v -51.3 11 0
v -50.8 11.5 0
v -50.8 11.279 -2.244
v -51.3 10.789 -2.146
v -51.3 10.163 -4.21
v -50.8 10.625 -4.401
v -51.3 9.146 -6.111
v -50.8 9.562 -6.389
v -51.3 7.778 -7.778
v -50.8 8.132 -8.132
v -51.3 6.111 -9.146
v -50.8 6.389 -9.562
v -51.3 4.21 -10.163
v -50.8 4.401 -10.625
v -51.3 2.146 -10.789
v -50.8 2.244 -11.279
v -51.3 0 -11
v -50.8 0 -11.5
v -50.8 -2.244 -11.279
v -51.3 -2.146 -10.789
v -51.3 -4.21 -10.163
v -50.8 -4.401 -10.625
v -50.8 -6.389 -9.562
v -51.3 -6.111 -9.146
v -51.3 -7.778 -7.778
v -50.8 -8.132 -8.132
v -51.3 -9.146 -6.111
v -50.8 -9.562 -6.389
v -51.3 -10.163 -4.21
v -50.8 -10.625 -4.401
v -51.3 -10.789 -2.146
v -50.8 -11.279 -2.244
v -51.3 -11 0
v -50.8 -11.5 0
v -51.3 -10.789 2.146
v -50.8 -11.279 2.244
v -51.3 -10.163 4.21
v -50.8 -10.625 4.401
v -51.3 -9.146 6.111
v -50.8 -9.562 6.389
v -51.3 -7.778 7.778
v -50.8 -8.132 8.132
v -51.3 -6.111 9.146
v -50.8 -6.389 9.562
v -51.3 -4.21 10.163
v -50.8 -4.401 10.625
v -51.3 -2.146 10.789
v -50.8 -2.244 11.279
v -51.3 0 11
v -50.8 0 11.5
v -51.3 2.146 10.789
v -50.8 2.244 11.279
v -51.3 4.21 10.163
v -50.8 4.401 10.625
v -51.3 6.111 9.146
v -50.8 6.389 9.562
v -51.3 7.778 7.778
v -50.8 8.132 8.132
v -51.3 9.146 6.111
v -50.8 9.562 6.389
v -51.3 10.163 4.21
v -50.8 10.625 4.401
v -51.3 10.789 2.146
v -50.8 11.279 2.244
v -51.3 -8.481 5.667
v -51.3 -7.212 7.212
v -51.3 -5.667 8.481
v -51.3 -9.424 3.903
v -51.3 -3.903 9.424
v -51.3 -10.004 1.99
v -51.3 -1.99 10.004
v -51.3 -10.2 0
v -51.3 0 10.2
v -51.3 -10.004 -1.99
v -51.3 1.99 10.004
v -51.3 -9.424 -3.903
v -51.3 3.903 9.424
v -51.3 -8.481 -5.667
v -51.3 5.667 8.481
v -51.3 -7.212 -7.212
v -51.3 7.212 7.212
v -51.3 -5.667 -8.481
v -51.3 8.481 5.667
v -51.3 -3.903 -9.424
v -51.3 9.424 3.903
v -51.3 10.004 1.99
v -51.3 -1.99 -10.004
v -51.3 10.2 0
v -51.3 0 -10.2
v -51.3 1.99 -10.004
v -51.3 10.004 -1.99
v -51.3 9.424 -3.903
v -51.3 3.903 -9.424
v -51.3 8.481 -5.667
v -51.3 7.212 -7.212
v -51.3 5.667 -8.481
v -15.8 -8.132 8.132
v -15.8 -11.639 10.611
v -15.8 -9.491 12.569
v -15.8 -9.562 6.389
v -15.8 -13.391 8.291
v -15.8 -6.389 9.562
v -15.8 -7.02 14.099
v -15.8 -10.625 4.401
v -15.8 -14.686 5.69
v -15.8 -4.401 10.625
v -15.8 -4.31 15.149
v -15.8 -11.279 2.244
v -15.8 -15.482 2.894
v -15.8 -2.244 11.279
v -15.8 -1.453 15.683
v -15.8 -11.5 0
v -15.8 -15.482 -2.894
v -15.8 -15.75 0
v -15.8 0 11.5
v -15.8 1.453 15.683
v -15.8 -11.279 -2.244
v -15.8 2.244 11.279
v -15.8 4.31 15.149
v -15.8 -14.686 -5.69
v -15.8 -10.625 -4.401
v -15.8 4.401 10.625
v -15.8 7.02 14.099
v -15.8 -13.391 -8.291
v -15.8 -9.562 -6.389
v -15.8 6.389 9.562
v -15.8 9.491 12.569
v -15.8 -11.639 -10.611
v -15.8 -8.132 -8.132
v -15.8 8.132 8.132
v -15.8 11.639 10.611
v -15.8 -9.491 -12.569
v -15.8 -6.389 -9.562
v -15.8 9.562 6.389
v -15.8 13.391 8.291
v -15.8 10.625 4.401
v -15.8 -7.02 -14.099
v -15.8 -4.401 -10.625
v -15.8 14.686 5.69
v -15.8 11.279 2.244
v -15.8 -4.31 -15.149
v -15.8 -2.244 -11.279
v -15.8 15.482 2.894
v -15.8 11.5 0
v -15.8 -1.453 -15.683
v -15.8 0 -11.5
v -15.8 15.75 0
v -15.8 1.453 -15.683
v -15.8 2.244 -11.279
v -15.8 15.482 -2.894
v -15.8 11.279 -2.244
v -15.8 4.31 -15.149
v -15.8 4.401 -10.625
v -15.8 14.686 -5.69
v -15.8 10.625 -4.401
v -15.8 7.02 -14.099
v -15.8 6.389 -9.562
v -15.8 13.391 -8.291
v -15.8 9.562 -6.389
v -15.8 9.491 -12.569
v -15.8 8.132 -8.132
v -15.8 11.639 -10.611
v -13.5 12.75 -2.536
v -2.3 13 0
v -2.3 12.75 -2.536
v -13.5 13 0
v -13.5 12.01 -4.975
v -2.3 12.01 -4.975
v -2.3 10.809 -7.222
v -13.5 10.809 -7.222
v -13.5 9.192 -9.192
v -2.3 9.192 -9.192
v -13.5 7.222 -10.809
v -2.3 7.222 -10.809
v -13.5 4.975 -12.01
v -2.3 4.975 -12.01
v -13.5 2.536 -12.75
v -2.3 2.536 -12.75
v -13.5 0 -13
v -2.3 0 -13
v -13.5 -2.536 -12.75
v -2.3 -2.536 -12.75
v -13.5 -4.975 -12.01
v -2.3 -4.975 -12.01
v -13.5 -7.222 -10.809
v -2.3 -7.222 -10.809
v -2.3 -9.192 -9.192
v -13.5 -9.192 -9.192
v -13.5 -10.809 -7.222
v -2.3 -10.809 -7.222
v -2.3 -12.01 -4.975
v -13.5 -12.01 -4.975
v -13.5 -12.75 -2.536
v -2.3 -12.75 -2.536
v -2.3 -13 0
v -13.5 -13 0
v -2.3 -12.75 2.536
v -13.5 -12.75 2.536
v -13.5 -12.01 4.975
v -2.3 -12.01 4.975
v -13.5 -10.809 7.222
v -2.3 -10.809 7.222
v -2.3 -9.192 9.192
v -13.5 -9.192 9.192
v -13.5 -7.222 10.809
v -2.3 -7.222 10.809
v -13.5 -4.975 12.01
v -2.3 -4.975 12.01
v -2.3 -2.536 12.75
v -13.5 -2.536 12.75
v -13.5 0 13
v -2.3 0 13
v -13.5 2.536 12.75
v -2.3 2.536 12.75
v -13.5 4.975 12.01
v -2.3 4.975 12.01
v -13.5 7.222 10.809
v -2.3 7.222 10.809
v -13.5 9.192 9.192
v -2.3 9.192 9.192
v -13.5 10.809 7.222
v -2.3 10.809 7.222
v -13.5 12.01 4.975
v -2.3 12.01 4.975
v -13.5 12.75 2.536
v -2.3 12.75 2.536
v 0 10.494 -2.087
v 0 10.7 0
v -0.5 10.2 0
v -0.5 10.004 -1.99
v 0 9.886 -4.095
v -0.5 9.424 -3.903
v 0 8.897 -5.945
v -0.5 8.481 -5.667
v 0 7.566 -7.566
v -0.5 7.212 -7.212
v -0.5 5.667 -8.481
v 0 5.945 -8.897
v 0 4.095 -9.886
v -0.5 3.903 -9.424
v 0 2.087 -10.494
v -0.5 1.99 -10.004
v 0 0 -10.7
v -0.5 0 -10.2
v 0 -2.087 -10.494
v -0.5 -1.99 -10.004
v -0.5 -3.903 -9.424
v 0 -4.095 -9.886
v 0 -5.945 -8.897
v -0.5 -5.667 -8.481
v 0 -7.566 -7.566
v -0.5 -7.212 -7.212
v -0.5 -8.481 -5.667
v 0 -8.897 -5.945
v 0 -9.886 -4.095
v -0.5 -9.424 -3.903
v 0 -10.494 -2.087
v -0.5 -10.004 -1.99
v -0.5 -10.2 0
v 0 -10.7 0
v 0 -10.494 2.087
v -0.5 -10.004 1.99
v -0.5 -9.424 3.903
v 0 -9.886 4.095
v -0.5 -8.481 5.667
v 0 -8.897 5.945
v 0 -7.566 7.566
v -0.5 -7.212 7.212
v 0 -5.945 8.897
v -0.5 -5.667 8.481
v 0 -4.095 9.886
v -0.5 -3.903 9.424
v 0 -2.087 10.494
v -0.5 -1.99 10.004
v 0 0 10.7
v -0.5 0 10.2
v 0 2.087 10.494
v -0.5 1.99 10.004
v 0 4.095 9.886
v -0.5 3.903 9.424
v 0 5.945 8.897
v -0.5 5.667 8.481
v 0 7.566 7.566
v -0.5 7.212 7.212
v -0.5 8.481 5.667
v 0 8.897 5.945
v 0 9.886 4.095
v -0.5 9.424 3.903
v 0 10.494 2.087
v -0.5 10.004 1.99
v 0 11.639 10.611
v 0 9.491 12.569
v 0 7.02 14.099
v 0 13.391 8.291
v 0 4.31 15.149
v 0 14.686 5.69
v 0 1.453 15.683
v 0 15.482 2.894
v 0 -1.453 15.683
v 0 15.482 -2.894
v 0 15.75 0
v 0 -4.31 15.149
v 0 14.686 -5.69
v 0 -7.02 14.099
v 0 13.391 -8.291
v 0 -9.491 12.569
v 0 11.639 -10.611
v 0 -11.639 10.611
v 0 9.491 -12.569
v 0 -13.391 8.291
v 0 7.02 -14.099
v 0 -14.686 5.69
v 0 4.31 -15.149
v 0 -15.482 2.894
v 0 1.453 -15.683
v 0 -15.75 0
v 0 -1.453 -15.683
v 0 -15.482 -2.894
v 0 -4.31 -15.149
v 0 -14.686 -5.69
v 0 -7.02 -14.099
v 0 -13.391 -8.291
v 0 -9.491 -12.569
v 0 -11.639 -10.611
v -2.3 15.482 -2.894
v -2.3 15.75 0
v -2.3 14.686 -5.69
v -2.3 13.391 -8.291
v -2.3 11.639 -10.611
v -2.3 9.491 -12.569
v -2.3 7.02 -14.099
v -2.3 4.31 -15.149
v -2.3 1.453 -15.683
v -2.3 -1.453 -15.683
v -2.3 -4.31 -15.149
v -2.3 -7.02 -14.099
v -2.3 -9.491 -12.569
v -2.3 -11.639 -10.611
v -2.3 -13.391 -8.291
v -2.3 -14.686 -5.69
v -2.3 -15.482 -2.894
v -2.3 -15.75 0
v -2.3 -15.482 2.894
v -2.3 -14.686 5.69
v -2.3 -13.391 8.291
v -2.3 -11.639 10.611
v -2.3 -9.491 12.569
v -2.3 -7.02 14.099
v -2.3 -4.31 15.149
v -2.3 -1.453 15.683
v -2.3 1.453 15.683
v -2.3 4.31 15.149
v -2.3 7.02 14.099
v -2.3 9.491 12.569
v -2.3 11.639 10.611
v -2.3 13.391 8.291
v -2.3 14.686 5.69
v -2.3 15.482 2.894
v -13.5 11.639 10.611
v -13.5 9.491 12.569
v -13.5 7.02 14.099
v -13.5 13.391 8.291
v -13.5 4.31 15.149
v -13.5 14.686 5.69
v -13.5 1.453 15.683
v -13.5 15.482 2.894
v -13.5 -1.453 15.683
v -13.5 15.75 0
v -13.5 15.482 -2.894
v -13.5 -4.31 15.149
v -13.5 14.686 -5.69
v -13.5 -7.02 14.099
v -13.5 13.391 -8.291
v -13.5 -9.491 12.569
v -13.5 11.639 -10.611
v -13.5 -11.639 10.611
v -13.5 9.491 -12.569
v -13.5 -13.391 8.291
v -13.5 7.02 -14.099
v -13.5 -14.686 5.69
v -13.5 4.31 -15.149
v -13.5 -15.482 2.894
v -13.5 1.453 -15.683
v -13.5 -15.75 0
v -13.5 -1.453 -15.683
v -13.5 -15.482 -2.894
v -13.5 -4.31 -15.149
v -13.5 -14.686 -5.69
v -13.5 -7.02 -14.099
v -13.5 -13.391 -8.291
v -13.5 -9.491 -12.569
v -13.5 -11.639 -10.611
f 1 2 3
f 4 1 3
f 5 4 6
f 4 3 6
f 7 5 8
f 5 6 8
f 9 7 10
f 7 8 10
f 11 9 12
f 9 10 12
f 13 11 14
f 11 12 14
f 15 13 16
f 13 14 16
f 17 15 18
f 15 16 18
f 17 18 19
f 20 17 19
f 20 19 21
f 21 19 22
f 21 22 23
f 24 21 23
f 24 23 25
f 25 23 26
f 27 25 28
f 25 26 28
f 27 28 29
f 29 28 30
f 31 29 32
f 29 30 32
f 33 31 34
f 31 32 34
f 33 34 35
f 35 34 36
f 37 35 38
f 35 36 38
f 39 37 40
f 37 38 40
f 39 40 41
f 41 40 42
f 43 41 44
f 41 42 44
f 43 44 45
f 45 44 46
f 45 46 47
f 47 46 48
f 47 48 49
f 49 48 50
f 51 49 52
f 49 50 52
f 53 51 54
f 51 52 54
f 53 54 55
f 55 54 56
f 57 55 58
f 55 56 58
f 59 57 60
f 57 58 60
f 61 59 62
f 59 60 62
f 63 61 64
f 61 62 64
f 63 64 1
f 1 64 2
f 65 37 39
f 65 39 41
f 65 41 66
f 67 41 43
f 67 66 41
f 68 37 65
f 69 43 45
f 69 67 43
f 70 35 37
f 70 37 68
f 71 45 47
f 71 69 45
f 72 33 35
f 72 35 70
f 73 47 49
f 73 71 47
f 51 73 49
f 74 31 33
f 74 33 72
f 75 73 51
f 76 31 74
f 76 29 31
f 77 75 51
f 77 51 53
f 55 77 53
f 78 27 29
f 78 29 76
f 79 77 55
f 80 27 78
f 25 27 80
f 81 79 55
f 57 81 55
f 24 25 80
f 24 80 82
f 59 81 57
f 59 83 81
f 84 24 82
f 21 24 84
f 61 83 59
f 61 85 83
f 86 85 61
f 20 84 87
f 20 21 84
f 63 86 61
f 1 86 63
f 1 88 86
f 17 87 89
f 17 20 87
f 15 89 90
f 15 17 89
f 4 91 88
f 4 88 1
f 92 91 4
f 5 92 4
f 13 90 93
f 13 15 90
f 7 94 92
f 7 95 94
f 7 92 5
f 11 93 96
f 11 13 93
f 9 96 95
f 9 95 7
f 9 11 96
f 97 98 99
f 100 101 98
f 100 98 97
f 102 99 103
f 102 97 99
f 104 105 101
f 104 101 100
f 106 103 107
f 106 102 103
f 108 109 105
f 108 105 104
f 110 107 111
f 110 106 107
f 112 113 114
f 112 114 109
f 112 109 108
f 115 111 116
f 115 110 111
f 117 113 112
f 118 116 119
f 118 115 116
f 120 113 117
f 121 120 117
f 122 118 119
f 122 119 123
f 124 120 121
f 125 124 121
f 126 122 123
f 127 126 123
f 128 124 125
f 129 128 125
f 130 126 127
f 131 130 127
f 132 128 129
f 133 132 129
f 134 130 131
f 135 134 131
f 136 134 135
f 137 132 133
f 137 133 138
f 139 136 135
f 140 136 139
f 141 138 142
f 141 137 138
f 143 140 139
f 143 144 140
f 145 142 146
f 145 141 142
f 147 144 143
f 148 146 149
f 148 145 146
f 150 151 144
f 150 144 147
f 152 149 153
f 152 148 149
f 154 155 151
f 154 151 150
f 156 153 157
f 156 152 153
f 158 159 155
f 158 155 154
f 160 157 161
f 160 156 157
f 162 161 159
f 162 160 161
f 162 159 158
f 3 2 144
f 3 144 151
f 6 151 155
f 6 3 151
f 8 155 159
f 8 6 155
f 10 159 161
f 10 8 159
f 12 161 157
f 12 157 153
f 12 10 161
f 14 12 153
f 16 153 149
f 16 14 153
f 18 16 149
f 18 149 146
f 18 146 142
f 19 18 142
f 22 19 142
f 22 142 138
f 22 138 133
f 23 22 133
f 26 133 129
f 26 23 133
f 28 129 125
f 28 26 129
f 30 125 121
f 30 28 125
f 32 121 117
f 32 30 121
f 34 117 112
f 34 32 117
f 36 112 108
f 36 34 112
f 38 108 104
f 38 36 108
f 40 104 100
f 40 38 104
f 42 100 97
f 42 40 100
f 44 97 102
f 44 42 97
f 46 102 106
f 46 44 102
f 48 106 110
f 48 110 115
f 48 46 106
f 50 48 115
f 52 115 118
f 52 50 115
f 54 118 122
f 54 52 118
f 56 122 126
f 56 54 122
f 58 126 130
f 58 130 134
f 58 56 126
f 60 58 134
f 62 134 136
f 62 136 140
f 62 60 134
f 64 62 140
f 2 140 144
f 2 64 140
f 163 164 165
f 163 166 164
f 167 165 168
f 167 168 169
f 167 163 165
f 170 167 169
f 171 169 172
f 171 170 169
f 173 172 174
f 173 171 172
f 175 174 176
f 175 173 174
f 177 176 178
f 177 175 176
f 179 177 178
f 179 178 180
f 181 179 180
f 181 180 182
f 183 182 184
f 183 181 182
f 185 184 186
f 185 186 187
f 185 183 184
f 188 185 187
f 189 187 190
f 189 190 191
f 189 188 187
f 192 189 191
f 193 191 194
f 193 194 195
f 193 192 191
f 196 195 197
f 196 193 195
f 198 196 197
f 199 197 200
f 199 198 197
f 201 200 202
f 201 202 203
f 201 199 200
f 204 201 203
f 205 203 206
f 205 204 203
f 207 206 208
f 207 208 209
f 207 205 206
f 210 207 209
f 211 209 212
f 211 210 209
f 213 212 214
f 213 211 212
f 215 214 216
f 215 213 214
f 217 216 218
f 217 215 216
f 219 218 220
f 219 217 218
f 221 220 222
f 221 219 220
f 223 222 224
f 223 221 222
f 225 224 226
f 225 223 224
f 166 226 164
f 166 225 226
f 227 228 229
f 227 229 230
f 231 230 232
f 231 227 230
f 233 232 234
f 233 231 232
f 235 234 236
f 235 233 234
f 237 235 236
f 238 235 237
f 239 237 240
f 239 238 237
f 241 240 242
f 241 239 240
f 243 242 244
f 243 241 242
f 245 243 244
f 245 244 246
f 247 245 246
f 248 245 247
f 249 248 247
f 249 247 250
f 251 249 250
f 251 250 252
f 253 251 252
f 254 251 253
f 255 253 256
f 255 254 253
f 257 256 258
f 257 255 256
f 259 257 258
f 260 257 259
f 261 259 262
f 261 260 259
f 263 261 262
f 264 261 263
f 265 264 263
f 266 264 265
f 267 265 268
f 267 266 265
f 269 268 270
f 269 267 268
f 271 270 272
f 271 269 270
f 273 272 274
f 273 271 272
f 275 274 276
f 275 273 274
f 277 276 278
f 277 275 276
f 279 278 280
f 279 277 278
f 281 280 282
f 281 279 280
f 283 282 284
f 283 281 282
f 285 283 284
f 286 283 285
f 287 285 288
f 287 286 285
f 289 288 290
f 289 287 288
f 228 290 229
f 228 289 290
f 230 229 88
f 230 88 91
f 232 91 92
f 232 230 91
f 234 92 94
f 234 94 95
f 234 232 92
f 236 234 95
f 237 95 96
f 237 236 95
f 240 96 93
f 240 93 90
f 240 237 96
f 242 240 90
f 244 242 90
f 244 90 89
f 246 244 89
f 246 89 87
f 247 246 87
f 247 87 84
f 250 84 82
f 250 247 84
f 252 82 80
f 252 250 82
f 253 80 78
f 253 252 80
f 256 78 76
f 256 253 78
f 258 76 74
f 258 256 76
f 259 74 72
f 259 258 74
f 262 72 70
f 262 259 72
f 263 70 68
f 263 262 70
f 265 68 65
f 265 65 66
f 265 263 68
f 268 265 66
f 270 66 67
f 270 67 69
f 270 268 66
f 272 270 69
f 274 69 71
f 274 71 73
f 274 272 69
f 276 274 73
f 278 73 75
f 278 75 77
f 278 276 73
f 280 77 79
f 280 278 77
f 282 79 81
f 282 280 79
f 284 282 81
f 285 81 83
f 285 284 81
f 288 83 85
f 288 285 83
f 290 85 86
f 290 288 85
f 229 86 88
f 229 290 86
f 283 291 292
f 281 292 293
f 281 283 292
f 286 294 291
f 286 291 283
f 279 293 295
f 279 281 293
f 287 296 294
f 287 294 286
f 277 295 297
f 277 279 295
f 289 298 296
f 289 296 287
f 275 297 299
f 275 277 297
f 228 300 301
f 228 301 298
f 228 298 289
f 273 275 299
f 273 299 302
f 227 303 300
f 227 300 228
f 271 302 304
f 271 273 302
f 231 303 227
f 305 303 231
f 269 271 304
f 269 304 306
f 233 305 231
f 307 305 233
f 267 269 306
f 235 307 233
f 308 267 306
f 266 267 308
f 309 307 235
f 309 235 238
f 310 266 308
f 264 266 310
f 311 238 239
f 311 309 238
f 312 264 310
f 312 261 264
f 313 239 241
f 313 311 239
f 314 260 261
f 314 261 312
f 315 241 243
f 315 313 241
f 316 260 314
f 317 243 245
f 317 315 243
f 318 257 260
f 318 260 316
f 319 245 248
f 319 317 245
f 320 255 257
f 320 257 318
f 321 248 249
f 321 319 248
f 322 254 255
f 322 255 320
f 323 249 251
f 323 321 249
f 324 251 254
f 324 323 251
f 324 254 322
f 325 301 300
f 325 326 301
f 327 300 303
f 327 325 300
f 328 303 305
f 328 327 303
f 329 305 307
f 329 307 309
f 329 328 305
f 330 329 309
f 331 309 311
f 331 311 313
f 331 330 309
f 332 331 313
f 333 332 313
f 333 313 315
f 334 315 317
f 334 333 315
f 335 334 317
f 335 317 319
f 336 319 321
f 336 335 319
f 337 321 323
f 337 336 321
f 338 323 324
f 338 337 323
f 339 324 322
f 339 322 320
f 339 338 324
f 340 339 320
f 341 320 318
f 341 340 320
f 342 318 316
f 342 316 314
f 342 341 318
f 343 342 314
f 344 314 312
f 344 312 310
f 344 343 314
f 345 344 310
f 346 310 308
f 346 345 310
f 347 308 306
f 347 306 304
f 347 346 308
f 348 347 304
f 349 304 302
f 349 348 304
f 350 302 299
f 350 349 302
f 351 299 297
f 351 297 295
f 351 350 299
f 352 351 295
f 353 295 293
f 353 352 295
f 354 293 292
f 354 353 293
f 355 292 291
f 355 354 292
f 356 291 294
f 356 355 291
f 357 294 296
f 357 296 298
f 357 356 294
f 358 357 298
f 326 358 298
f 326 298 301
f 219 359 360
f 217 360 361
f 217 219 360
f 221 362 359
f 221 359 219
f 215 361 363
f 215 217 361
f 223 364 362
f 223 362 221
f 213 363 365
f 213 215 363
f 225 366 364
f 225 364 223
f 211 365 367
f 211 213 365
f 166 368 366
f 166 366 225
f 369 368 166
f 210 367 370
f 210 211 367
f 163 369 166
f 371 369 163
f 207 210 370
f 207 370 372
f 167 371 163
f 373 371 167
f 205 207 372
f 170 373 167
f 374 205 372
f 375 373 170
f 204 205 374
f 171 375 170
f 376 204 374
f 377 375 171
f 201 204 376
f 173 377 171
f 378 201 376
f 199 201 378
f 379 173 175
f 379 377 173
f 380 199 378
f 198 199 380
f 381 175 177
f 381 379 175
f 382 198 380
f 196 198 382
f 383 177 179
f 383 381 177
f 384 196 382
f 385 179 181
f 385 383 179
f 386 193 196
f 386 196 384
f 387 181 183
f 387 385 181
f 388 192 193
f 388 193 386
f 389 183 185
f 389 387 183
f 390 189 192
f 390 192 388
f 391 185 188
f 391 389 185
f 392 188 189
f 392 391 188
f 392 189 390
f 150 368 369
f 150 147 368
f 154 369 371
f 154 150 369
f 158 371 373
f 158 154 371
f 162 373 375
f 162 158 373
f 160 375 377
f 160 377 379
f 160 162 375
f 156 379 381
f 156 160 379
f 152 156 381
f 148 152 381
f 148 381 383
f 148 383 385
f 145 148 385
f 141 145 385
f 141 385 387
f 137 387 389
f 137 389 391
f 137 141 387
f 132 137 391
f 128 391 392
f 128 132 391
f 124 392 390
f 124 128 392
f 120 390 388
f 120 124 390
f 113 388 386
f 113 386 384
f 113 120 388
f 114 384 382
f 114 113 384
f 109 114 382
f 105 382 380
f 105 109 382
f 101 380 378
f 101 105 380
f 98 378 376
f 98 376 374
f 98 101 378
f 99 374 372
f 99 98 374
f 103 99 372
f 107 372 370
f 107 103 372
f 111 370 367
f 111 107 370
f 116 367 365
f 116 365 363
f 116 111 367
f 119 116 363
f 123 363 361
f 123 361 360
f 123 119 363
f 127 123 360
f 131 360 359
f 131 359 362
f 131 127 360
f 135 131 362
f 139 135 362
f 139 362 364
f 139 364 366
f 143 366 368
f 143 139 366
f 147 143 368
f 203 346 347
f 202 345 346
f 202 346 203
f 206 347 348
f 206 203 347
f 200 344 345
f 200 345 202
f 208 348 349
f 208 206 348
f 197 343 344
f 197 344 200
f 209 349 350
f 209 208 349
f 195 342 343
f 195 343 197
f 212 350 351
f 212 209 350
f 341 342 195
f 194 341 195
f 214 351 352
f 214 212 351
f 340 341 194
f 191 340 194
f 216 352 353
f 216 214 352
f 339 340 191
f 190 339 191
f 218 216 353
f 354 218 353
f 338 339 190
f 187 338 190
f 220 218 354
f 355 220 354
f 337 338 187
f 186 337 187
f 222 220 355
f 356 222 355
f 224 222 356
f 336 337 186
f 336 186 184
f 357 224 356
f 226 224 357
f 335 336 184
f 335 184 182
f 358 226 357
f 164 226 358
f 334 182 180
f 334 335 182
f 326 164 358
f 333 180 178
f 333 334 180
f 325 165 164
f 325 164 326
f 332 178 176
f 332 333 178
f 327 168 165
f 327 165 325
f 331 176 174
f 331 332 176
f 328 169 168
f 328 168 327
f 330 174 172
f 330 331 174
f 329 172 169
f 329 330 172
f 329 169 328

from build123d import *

# Parameters (mm, degrees)
F2_SIZE = 0.5


with BuildPart() as f1:
    # F0 (on Top) → F1 (revolve)
    with BuildSketch(Plane.XY):
        Polygon((-51.3, 11.5), (-51.3, 10.2), (0, 10.2), (0, 15.75), (-2.3, 15.75), (-2.3, 13), (-13.5, 13), (-13.5, 15.75), (-15.8, 15.75), (-15.8, 11.5), align=None)
    revolve(axis=Axis((-27.94127, 0, 0), (-1, 0, 0)))

    # F2
    f2_edges = [f1.edges().sort_by_distance(p)[0] for p in [
        (-51.3, -11.5, 0),
        (0, -10.2, 0),
    ]]
    chamfer(f2_edges, length=F2_SIZE)


solid = f1.part
